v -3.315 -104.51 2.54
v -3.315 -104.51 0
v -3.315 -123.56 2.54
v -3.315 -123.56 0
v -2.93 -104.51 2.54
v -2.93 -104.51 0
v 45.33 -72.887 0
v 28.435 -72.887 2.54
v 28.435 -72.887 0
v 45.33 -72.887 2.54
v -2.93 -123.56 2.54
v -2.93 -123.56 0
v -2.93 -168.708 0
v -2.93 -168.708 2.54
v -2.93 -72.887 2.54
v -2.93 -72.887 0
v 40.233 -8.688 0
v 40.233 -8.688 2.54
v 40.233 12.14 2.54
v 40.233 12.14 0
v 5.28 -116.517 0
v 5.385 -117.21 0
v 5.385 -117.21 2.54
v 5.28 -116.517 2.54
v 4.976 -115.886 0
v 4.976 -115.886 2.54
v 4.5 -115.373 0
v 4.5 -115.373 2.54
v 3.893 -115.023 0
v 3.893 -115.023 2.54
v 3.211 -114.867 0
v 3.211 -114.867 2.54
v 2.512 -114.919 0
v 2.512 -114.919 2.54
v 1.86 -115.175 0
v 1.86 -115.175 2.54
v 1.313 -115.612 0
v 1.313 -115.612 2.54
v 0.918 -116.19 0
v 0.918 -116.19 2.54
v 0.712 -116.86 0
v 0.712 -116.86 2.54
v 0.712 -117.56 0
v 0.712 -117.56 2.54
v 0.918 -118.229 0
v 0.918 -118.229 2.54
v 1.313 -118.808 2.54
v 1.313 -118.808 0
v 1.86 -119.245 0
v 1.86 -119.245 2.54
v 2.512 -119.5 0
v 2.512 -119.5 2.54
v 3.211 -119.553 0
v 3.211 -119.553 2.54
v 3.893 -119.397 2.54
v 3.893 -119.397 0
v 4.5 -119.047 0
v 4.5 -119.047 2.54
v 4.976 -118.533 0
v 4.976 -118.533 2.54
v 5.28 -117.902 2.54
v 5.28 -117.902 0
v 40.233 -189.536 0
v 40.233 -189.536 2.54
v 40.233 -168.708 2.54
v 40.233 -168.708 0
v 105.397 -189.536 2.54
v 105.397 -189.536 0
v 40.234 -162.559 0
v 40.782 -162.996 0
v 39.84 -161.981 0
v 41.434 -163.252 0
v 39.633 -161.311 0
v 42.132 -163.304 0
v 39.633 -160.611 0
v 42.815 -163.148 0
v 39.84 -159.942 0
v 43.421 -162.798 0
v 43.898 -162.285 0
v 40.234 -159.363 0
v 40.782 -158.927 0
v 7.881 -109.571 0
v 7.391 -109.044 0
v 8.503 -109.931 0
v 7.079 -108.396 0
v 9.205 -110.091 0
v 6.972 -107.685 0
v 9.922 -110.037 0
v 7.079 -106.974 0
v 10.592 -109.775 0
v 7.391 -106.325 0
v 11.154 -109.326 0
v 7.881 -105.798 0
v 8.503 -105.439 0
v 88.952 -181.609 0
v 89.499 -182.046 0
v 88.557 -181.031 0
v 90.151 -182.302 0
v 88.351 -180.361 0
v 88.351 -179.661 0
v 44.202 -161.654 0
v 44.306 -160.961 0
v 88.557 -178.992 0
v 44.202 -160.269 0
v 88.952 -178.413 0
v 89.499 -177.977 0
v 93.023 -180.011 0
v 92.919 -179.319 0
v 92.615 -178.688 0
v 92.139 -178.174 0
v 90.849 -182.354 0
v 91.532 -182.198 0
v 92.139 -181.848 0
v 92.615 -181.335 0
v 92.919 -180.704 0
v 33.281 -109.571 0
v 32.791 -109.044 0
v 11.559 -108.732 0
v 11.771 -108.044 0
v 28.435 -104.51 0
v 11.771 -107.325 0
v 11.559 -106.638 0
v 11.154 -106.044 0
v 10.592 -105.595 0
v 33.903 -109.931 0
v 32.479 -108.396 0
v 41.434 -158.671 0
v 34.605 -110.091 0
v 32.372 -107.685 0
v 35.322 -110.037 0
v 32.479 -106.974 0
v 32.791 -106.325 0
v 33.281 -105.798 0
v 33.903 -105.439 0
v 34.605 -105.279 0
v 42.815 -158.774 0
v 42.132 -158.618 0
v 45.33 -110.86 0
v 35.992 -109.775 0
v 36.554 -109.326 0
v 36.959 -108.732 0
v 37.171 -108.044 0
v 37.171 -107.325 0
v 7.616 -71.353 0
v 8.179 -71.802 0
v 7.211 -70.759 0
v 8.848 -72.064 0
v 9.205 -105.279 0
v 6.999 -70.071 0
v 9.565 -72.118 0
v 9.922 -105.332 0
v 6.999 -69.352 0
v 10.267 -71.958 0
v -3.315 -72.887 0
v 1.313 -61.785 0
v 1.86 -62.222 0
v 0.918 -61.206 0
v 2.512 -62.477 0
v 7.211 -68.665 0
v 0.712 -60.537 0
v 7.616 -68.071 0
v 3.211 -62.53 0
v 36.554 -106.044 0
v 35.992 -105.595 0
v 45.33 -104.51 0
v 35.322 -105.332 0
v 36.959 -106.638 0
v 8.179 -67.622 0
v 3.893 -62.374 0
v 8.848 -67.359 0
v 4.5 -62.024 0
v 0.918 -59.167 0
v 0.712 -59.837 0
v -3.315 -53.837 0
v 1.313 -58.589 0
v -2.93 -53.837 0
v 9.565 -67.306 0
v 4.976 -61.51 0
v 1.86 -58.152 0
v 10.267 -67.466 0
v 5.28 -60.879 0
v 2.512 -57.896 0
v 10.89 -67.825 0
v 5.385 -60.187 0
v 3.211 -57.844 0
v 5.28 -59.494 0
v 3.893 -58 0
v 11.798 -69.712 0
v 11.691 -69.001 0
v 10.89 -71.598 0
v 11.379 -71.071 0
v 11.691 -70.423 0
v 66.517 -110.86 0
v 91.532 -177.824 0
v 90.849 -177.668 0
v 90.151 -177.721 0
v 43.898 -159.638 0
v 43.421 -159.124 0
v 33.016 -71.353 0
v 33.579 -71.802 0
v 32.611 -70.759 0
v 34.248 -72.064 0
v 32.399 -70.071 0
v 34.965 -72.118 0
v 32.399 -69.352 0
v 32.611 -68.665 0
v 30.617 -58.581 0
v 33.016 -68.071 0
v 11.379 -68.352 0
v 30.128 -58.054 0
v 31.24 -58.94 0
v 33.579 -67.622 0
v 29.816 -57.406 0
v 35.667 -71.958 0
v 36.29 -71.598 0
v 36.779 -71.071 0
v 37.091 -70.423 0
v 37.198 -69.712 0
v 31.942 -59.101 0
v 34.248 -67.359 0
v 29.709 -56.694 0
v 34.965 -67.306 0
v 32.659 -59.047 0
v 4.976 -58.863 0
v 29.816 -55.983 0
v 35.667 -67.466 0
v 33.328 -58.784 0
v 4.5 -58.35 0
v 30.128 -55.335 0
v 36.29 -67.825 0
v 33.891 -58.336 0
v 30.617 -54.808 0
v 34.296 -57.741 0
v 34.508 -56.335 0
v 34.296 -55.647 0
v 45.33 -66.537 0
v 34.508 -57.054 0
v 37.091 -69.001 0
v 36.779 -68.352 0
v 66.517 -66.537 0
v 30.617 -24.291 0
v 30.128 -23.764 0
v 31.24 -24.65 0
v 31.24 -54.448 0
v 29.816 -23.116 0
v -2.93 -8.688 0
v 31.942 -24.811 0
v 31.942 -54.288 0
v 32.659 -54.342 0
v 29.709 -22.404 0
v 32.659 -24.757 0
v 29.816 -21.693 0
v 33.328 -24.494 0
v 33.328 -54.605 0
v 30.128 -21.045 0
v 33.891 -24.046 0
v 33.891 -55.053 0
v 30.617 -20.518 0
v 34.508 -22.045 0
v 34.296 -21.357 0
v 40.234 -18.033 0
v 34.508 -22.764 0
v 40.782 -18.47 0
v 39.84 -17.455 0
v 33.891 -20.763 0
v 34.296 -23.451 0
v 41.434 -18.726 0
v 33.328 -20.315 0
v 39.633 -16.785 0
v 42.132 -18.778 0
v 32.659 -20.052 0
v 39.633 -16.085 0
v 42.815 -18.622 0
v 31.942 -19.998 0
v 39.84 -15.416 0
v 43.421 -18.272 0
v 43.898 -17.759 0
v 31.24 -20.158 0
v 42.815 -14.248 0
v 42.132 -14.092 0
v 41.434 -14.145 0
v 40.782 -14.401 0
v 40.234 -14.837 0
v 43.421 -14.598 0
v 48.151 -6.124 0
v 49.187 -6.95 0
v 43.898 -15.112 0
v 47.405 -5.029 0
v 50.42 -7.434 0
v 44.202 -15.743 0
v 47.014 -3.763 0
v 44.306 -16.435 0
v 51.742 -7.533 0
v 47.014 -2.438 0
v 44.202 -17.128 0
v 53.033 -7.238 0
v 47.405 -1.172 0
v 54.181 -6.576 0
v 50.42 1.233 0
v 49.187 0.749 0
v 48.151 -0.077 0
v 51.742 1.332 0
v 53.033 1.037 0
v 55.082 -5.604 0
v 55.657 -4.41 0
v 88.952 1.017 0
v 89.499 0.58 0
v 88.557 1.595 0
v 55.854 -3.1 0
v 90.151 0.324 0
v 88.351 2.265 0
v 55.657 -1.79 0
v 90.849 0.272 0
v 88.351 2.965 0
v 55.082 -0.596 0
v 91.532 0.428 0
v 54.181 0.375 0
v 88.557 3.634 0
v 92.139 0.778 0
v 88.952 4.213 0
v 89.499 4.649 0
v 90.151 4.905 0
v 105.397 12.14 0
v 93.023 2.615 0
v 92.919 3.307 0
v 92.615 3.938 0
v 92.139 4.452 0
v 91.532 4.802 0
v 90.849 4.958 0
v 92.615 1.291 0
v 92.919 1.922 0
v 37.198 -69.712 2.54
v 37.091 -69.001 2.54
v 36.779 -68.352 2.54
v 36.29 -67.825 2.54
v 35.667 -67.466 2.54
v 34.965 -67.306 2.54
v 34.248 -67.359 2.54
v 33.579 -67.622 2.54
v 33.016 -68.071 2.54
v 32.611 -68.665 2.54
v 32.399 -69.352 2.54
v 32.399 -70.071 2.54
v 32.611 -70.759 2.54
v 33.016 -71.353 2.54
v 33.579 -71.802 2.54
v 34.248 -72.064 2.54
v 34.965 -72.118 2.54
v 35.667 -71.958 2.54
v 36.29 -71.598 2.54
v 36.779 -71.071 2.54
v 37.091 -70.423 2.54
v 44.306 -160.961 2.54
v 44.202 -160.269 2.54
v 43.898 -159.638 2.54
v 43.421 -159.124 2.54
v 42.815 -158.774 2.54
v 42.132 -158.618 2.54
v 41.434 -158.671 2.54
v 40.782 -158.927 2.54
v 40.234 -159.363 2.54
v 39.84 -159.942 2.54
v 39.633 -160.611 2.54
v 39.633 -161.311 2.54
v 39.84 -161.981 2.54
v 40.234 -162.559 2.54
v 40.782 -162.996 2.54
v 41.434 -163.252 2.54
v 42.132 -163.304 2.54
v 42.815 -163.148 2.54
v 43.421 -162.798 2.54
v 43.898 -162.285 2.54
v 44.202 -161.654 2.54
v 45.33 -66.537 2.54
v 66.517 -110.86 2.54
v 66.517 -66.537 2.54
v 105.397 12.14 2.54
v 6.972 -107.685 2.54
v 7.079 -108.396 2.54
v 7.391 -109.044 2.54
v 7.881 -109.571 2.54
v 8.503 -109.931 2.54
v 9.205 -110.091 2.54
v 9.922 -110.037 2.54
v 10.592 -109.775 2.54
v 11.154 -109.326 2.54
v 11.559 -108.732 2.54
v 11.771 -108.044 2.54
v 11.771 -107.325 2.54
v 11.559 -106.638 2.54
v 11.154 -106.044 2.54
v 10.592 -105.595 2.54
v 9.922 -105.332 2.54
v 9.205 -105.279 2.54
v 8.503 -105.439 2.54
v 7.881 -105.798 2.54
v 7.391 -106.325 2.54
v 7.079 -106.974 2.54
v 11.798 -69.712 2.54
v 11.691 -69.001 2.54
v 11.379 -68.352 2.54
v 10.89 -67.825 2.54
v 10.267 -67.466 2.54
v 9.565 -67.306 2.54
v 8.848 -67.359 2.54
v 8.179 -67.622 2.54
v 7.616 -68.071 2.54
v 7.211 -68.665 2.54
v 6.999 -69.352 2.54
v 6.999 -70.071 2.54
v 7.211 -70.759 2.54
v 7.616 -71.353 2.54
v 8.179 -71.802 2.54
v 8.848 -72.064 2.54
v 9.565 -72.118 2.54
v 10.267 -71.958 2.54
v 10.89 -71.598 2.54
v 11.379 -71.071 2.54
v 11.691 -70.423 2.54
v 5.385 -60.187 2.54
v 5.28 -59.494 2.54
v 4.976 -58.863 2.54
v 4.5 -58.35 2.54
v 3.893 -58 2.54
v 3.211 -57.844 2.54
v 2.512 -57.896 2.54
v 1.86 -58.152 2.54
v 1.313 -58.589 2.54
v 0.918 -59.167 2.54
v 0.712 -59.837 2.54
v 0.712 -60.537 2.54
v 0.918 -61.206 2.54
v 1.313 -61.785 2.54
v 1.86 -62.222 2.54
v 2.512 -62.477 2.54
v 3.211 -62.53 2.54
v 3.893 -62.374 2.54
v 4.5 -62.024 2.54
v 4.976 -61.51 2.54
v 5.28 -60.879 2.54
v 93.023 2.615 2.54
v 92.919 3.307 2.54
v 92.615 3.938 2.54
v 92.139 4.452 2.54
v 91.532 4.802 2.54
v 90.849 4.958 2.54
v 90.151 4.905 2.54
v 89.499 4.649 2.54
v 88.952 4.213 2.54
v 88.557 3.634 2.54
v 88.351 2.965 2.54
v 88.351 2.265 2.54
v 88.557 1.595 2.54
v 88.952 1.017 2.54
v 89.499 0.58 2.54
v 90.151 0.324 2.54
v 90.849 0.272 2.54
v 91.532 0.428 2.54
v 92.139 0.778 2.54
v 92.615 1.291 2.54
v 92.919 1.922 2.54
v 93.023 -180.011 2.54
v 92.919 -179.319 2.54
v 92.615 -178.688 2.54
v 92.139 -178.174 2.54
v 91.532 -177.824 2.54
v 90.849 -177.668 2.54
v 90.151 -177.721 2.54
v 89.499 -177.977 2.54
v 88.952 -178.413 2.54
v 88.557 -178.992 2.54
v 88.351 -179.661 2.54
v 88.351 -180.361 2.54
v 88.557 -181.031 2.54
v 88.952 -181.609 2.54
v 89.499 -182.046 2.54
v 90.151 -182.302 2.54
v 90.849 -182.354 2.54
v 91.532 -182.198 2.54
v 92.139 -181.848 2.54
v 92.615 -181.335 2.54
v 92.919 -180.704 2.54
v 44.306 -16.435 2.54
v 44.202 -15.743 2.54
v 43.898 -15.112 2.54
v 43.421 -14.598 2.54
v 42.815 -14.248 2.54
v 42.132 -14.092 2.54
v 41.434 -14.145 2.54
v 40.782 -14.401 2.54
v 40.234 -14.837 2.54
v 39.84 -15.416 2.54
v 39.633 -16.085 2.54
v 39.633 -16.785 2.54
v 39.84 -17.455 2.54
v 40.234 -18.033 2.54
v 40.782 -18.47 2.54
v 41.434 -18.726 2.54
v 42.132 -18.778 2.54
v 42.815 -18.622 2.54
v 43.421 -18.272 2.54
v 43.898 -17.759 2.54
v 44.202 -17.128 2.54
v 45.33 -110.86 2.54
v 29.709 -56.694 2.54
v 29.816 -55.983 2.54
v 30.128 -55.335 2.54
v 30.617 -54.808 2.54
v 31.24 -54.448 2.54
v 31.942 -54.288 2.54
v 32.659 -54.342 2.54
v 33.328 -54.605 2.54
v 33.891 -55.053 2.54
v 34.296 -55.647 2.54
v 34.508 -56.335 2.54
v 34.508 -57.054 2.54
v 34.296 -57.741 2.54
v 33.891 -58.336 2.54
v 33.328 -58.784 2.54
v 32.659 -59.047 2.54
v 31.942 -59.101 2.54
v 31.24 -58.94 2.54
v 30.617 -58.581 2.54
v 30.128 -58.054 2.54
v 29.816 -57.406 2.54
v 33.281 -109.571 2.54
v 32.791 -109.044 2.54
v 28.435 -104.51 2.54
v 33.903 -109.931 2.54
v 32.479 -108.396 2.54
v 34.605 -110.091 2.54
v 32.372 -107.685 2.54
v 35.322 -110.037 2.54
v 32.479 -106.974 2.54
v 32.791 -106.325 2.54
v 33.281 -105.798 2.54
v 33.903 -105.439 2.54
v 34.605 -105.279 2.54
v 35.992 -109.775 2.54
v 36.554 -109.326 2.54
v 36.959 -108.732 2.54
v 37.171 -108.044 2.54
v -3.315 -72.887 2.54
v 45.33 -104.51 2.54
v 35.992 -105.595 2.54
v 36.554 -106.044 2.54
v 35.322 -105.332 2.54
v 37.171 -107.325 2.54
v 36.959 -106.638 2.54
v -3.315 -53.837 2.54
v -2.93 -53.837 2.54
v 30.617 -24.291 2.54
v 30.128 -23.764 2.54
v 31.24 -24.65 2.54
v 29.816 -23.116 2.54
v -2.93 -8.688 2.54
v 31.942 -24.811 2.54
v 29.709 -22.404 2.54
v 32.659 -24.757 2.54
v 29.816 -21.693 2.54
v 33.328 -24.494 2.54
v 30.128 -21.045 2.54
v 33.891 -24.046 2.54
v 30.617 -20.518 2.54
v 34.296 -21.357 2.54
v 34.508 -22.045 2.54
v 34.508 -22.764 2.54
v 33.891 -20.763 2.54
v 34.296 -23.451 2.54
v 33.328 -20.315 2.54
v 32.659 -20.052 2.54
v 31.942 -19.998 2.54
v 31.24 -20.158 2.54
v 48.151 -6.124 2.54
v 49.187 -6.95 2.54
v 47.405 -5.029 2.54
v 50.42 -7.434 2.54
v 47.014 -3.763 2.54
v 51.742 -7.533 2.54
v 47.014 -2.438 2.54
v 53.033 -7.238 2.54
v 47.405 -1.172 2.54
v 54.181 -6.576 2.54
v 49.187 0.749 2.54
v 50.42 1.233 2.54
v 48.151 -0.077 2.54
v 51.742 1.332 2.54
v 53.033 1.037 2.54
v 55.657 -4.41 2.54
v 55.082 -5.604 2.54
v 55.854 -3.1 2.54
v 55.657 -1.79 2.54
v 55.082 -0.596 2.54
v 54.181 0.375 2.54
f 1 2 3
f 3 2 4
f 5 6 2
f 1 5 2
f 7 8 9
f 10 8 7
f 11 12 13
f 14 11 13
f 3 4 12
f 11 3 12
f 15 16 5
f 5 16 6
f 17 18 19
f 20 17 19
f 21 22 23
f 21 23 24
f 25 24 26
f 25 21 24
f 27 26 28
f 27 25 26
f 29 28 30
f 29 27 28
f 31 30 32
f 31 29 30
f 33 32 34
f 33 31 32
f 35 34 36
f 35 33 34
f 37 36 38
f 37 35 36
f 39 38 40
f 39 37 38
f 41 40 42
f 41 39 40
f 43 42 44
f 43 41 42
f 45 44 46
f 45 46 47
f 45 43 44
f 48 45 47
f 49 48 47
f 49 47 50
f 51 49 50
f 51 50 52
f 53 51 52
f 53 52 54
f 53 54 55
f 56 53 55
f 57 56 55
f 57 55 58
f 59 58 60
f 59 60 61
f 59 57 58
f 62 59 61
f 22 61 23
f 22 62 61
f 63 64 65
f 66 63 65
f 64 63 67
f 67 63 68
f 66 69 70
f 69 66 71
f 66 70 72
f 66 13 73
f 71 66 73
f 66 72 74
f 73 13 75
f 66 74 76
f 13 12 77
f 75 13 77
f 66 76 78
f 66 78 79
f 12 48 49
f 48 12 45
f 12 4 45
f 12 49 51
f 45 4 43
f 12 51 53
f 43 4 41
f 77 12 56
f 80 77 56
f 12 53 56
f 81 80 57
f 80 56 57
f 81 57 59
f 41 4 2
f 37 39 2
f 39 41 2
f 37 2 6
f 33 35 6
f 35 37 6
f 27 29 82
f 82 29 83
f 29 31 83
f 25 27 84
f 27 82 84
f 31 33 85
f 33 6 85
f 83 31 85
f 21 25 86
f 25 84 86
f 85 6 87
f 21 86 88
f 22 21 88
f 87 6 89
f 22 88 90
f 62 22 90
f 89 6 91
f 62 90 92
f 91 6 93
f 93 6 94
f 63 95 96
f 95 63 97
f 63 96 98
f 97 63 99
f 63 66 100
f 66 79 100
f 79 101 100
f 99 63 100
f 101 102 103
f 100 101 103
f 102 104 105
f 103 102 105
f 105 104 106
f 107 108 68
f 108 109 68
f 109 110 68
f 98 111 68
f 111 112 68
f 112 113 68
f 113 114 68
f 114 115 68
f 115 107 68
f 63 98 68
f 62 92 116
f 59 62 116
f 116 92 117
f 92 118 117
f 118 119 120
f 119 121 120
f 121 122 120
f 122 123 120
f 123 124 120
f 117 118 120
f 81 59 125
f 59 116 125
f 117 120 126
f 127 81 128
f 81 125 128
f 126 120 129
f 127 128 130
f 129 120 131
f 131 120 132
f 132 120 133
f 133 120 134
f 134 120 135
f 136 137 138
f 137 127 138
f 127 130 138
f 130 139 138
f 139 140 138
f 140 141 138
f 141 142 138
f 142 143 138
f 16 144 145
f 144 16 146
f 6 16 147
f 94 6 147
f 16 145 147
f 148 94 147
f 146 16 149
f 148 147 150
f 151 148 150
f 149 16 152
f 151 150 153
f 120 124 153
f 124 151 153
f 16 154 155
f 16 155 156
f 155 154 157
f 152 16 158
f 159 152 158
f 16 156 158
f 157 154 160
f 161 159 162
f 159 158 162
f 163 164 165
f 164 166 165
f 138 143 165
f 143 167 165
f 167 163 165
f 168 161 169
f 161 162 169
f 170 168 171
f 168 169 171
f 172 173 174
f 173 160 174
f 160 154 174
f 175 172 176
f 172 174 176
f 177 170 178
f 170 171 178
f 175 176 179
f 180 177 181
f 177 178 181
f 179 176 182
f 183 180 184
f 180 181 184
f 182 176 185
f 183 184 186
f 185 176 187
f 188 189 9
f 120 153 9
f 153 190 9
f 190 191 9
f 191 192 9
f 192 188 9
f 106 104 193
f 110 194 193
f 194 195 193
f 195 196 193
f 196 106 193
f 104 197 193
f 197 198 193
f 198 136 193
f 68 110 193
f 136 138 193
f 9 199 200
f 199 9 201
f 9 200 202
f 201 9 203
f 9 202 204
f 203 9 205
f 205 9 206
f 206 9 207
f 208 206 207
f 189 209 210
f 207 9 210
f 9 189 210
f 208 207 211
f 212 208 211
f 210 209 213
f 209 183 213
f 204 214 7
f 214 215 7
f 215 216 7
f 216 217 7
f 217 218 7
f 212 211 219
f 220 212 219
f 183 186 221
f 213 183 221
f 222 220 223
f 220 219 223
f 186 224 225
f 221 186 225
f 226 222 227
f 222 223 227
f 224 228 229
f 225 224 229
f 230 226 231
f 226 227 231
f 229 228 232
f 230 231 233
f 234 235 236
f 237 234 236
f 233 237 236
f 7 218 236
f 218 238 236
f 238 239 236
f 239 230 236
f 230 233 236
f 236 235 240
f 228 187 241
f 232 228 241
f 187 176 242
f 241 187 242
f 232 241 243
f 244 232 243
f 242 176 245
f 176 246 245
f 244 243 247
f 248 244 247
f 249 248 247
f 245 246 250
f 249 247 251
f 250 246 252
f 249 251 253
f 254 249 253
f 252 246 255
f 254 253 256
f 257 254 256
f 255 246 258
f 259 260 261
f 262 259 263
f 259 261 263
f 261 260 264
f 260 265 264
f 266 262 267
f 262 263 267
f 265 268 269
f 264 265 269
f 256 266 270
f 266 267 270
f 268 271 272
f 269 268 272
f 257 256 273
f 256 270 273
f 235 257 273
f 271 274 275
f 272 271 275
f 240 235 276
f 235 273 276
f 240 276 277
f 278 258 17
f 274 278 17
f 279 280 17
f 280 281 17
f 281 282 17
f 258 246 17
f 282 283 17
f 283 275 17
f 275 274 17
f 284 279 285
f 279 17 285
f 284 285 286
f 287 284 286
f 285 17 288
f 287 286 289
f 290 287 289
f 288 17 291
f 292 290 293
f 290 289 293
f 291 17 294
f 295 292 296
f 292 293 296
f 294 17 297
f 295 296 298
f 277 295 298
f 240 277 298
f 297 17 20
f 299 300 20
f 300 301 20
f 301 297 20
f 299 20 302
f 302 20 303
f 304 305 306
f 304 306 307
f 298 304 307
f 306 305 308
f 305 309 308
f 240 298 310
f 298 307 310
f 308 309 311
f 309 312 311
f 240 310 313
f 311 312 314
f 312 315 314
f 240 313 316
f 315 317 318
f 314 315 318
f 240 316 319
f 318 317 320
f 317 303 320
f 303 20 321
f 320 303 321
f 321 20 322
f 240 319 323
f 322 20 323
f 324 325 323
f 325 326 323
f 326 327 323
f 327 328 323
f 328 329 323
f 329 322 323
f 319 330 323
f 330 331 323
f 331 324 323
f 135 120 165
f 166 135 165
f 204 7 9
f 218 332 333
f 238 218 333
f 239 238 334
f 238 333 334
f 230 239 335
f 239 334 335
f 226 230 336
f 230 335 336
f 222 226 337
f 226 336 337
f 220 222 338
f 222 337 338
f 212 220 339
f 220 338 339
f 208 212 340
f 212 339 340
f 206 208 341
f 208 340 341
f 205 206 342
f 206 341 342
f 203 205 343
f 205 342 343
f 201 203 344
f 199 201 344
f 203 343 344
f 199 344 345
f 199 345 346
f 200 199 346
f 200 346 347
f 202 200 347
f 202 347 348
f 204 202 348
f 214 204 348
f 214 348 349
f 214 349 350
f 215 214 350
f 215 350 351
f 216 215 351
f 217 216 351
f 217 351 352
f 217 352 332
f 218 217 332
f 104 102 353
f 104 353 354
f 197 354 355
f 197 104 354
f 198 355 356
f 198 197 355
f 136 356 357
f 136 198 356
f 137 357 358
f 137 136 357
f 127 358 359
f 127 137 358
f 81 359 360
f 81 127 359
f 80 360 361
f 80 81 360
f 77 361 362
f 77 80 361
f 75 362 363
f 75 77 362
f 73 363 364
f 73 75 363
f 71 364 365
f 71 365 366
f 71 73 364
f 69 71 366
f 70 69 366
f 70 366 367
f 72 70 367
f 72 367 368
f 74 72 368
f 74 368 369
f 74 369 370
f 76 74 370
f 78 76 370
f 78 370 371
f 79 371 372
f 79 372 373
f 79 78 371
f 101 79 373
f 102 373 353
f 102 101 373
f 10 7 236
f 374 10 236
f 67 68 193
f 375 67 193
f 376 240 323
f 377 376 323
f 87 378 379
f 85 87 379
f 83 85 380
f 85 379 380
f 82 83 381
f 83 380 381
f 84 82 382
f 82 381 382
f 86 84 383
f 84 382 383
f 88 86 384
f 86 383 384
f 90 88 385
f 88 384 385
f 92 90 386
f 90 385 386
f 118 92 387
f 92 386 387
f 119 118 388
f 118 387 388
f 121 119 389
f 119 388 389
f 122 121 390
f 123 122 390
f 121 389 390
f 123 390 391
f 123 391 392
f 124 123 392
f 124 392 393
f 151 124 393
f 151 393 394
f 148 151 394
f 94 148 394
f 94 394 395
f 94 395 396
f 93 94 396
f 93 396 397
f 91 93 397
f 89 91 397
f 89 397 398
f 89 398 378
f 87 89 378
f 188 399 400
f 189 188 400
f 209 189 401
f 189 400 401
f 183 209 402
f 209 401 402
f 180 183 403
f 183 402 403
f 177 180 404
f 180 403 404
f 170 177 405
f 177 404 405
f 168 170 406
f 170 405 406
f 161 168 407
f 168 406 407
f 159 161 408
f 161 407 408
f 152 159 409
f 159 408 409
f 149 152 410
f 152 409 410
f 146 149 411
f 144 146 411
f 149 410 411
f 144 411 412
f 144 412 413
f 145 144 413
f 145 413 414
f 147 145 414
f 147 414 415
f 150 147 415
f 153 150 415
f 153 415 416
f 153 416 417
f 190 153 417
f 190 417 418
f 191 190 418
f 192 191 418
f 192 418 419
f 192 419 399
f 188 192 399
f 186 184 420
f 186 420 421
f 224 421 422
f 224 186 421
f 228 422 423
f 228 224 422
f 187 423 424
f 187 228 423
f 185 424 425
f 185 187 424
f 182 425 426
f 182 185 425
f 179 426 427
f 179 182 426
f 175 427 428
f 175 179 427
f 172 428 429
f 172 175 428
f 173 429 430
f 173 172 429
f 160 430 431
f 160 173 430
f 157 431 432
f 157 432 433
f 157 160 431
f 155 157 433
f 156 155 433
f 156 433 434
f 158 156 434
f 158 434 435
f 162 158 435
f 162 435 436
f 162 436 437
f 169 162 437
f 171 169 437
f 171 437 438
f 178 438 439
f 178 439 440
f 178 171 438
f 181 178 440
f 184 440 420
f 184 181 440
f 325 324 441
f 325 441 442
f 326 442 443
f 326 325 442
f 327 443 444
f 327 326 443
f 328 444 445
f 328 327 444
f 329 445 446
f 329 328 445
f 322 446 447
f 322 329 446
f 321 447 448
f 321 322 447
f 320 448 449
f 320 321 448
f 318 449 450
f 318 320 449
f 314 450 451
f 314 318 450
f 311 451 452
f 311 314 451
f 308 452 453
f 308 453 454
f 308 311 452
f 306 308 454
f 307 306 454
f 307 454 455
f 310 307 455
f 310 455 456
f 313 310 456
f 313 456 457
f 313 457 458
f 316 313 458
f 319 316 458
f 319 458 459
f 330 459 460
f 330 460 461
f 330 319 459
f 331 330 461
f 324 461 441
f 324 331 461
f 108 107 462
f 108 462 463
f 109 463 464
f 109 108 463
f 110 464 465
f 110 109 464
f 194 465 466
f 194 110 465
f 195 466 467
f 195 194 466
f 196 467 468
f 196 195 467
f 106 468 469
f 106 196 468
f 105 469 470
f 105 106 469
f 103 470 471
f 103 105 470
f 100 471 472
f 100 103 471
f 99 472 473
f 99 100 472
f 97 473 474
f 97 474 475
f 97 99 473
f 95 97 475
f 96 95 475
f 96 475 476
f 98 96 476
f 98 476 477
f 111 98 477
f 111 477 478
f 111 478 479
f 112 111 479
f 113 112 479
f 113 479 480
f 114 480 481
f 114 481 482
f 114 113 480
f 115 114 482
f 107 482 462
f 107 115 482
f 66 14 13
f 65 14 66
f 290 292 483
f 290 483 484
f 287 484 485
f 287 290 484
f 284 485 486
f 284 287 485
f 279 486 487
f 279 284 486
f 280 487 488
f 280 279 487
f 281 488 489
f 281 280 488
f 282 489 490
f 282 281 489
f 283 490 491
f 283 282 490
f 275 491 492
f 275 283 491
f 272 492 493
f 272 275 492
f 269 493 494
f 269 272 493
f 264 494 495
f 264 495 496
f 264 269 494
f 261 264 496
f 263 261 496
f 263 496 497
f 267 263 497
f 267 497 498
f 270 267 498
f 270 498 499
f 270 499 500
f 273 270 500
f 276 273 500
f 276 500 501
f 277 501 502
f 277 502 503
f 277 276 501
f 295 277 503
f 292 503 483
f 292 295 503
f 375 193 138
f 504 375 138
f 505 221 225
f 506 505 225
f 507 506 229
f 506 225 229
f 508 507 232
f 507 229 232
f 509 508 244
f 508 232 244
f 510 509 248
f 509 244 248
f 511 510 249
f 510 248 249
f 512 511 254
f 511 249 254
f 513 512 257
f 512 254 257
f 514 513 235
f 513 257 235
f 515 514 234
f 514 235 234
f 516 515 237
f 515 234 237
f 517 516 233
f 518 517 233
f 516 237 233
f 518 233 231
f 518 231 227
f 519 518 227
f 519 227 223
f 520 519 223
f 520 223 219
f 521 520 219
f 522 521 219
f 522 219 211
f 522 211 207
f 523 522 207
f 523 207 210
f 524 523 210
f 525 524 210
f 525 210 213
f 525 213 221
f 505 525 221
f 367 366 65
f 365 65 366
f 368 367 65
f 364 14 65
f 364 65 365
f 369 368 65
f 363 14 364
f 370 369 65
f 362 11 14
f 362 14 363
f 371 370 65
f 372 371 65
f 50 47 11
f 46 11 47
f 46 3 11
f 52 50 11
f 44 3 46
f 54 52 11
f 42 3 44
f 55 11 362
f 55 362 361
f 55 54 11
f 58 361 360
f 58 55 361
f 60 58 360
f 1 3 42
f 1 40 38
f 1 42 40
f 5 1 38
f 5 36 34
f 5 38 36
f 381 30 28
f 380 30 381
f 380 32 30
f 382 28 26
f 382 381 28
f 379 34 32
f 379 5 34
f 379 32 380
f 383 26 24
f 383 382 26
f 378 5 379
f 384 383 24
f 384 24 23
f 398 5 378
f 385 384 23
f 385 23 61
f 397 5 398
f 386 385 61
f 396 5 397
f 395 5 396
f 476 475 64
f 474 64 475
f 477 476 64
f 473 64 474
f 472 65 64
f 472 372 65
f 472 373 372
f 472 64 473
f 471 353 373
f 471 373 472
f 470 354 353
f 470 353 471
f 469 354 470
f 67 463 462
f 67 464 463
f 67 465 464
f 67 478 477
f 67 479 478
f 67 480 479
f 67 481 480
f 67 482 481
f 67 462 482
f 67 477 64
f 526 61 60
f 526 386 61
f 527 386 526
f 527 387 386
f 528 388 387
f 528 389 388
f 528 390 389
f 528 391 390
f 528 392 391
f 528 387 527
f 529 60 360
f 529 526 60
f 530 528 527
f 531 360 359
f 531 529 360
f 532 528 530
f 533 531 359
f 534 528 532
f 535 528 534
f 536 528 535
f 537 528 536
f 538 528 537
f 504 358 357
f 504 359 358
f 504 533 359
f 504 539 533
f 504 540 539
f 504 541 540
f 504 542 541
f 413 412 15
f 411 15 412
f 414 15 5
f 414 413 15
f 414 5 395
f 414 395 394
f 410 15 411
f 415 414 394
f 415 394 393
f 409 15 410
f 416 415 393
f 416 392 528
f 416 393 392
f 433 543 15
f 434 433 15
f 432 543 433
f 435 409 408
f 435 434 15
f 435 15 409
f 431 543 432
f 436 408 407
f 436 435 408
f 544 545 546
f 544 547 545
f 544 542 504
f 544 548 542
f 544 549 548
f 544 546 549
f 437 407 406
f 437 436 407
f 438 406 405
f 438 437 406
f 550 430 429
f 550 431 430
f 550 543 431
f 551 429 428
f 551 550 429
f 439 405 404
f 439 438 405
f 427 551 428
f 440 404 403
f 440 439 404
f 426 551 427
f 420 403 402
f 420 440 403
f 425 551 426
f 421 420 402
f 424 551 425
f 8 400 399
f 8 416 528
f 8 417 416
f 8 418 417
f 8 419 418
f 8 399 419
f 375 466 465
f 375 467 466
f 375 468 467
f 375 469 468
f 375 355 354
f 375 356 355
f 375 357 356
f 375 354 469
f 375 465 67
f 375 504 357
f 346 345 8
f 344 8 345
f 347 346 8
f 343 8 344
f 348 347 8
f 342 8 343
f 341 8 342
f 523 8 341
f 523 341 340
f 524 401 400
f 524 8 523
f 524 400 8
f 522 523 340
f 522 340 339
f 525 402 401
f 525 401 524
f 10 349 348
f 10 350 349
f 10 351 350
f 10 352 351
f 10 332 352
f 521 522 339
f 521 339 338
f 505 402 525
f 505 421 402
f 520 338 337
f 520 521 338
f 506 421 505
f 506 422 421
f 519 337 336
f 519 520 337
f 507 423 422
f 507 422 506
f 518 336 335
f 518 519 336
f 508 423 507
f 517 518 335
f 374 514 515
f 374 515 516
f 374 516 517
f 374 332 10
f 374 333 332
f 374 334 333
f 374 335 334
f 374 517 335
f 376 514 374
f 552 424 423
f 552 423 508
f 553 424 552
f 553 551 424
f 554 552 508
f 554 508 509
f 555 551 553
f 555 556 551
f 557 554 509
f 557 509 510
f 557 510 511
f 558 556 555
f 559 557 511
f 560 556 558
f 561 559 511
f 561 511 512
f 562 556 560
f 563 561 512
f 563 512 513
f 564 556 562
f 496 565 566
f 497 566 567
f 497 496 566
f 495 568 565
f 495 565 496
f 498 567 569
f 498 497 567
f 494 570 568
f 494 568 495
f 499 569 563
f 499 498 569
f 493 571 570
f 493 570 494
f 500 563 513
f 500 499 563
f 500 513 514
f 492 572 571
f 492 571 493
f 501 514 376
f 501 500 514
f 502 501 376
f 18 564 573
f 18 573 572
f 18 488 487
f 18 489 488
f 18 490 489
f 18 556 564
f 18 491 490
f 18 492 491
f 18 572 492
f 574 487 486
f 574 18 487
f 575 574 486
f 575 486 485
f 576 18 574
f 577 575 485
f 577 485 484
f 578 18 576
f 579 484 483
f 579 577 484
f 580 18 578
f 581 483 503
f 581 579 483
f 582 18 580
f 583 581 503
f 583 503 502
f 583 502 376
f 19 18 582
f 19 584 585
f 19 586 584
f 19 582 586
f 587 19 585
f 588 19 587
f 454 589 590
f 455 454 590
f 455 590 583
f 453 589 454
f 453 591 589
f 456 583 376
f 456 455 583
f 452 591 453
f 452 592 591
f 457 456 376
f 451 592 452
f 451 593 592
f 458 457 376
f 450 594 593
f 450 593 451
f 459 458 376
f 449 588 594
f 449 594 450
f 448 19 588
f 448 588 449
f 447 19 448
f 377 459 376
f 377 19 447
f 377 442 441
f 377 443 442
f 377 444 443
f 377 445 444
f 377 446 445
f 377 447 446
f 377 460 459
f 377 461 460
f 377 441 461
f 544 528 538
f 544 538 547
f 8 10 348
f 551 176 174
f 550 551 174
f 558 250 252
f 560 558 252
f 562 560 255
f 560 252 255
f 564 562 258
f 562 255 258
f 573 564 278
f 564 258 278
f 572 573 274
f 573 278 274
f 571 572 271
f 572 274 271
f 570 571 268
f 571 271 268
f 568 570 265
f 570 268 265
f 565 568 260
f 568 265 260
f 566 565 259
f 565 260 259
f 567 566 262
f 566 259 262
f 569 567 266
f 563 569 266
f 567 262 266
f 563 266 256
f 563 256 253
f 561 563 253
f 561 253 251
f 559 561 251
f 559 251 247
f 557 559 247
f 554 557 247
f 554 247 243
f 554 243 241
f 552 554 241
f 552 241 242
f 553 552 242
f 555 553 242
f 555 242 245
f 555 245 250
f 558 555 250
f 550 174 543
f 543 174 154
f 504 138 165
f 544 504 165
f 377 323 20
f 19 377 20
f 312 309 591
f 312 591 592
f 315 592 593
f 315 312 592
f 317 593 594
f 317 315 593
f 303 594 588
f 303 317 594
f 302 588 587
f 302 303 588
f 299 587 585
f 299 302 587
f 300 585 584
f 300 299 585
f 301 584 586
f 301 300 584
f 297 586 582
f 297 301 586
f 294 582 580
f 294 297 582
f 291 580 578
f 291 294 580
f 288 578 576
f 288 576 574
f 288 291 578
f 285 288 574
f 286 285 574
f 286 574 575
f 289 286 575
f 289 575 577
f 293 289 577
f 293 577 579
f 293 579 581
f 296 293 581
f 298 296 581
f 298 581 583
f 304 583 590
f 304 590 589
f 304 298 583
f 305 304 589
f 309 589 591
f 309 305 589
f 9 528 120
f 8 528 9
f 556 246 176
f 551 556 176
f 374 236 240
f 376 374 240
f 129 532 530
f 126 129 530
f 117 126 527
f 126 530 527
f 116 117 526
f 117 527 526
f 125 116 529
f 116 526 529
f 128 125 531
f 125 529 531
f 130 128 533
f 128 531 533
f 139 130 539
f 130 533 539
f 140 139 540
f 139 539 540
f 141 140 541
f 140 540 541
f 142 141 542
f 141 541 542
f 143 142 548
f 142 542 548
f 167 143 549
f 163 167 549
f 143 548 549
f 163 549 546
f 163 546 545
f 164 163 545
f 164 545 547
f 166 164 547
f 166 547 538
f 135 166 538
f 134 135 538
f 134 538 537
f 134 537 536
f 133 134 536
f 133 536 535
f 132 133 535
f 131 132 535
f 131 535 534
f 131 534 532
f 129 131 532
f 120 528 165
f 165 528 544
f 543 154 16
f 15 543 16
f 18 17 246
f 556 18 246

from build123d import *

# Parameters (mm, degrees)
SKETCH1_R           = 2.3495
SKETCH1_R_2         = 4.445
BOSS_EXTRUDE1_DEPTH = 2.54
SKETCH2_R           = 2.413
CUT_EXTRUDE1_DEPTH  = 217.884748371
SKETCH3_W           = 16.89488816
SKETCH3_H           = 31.623
CUT_EXTRUDE2_DEPTH  = 217.884748371
SKETCH4_W           = 12.77569874
SKETCH4_H           = 24.435209008
SKETCH4_W_2         = 40.233428475
SKETCH4_H_2         = 28.333759116
CUT_EXTRUDE3_DEPTH  = 217.884748371
SKETCH5_R           = 2.413
CUT_EXTRUDE4_DEPTH  = 217.884748371


with BuildPart() as part:
    # Sketch1 → Boss-Extrude1 (new body)
    with BuildSketch(Plane.XY):
        Polygon((-2.930050059, -104.509781075), (-3.314938219, -104.509781075), (-3.314938219, -110.859781075), (-3.314938219, -123.559781075), (-2.930050059, -123.559781075), (-2.930050059, -168.708281075), (38.709428475, -168.708281075), (38.709428475, -189.536281075), (105.397061781, -189.536281075), (66.517436481, -110.859781075), (45.329949941, -110.859781075), (45.329949941, -104.509781075), (45.329949941, -72.886781075), (45.329949941, -66.536781075), (66.517436481, -66.536781075), (105.397061781, 12.139718925), (38.709428475, 12.139718925), (38.709428475, -8.688281075), (-2.930050059, -8.688281075), (-2.930050059, -53.836781075), (-3.314938219, -53.836781075), (-3.314938219, -66.536781075), (-3.314938219, -72.886781075), (-2.930050059, -72.886781075), align=None)
        with Locations((90.673911143, 2.614718925)):
            Circle(SKETCH1_R, mode=Mode.SUBTRACT)
        with Locations((41.95655448, -16.435281075)):
            Circle(SKETCH1_R, mode=Mode.SUBTRACT)
        with Locations((3.035061781, -60.186781075)):
            Circle(SKETCH1_R, mode=Mode.SUBTRACT)
        with Locations((3.035061781, -117.209781075)):
            Circle(SKETCH1_R, mode=Mode.SUBTRACT)
        with Locations((41.95655448, -160.961281075)):
            Circle(SKETCH1_R, mode=Mode.SUBTRACT)
        with Locations((90.673911143, -180.011281075)):
            Circle(SKETCH1_R, mode=Mode.SUBTRACT)
        with Locations((51.409428475, -3.100281075)):
            Circle(SKETCH1_R_2, mode=Mode.SUBTRACT)
    extrude(amount=BOSS_EXTRUDE1_DEPTH)

    # Sketch2 → Cut-Extrude1 (cut, through all)
    with BuildSketch(Plane.XY.offset(2.54)):
        with Locations((9.385061781, -69.711781075)):
            Circle(SKETCH2_R)
        with Locations((34.785061781, -69.711781075)):
            Circle(SKETCH2_R)
        with Locations(Location((34.785061781, -107.684781075, 0), (0, 0, 180))):
            Circle(SKETCH2_R)
        with Locations(Location((9.385061781, -107.684781075, 0), (0, 0, 180))):
            Circle(SKETCH2_R)
    extrude(amount=-CUT_EXTRUDE1_DEPTH, mode=Mode.SUBTRACT)

    # Sketch3 → Cut-Extrude2 (cut, through all)
    with BuildSketch(Plane.XY.offset(2.54)):
        with Locations((36.882505861, -88.698281075)):
            Rectangle(SKETCH3_W, SKETCH3_H)
    extrude(amount=-CUT_EXTRUDE2_DEPTH, mode=Mode.SUBTRACT)

    # Sketch4 → Cut-Extrude3 (cut, through all)
    with BuildSketch(Plane.XY.offset(2.54)):
        with Locations((33.845579105, 3.529323429)):
            Rectangle(SKETCH4_W, SKETCH4_H)
        with Locations((20.116714238, -182.875160633)):
            Rectangle(SKETCH4_W_2, SKETCH4_H_2)
    extrude(amount=-CUT_EXTRUDE3_DEPTH, mode=Mode.SUBTRACT)

    # Sketch5 → Cut-Extrude4 (cut, through all)
    with BuildSketch(Plane(origin=(0, 0, 0), x_dir=(-1, 0, 0), z_dir=(0, 0, -1))):
        with Locations((-32.121949941, -22.404281075)):
            Circle(SKETCH5_R)
        with Locations((-32.121949941, -56.694281075)):
            Circle(SKETCH5_R)
    extrude(amount=-CUT_EXTRUDE4_DEPTH, mode=Mode.SUBTRACT)


solid = part.part
